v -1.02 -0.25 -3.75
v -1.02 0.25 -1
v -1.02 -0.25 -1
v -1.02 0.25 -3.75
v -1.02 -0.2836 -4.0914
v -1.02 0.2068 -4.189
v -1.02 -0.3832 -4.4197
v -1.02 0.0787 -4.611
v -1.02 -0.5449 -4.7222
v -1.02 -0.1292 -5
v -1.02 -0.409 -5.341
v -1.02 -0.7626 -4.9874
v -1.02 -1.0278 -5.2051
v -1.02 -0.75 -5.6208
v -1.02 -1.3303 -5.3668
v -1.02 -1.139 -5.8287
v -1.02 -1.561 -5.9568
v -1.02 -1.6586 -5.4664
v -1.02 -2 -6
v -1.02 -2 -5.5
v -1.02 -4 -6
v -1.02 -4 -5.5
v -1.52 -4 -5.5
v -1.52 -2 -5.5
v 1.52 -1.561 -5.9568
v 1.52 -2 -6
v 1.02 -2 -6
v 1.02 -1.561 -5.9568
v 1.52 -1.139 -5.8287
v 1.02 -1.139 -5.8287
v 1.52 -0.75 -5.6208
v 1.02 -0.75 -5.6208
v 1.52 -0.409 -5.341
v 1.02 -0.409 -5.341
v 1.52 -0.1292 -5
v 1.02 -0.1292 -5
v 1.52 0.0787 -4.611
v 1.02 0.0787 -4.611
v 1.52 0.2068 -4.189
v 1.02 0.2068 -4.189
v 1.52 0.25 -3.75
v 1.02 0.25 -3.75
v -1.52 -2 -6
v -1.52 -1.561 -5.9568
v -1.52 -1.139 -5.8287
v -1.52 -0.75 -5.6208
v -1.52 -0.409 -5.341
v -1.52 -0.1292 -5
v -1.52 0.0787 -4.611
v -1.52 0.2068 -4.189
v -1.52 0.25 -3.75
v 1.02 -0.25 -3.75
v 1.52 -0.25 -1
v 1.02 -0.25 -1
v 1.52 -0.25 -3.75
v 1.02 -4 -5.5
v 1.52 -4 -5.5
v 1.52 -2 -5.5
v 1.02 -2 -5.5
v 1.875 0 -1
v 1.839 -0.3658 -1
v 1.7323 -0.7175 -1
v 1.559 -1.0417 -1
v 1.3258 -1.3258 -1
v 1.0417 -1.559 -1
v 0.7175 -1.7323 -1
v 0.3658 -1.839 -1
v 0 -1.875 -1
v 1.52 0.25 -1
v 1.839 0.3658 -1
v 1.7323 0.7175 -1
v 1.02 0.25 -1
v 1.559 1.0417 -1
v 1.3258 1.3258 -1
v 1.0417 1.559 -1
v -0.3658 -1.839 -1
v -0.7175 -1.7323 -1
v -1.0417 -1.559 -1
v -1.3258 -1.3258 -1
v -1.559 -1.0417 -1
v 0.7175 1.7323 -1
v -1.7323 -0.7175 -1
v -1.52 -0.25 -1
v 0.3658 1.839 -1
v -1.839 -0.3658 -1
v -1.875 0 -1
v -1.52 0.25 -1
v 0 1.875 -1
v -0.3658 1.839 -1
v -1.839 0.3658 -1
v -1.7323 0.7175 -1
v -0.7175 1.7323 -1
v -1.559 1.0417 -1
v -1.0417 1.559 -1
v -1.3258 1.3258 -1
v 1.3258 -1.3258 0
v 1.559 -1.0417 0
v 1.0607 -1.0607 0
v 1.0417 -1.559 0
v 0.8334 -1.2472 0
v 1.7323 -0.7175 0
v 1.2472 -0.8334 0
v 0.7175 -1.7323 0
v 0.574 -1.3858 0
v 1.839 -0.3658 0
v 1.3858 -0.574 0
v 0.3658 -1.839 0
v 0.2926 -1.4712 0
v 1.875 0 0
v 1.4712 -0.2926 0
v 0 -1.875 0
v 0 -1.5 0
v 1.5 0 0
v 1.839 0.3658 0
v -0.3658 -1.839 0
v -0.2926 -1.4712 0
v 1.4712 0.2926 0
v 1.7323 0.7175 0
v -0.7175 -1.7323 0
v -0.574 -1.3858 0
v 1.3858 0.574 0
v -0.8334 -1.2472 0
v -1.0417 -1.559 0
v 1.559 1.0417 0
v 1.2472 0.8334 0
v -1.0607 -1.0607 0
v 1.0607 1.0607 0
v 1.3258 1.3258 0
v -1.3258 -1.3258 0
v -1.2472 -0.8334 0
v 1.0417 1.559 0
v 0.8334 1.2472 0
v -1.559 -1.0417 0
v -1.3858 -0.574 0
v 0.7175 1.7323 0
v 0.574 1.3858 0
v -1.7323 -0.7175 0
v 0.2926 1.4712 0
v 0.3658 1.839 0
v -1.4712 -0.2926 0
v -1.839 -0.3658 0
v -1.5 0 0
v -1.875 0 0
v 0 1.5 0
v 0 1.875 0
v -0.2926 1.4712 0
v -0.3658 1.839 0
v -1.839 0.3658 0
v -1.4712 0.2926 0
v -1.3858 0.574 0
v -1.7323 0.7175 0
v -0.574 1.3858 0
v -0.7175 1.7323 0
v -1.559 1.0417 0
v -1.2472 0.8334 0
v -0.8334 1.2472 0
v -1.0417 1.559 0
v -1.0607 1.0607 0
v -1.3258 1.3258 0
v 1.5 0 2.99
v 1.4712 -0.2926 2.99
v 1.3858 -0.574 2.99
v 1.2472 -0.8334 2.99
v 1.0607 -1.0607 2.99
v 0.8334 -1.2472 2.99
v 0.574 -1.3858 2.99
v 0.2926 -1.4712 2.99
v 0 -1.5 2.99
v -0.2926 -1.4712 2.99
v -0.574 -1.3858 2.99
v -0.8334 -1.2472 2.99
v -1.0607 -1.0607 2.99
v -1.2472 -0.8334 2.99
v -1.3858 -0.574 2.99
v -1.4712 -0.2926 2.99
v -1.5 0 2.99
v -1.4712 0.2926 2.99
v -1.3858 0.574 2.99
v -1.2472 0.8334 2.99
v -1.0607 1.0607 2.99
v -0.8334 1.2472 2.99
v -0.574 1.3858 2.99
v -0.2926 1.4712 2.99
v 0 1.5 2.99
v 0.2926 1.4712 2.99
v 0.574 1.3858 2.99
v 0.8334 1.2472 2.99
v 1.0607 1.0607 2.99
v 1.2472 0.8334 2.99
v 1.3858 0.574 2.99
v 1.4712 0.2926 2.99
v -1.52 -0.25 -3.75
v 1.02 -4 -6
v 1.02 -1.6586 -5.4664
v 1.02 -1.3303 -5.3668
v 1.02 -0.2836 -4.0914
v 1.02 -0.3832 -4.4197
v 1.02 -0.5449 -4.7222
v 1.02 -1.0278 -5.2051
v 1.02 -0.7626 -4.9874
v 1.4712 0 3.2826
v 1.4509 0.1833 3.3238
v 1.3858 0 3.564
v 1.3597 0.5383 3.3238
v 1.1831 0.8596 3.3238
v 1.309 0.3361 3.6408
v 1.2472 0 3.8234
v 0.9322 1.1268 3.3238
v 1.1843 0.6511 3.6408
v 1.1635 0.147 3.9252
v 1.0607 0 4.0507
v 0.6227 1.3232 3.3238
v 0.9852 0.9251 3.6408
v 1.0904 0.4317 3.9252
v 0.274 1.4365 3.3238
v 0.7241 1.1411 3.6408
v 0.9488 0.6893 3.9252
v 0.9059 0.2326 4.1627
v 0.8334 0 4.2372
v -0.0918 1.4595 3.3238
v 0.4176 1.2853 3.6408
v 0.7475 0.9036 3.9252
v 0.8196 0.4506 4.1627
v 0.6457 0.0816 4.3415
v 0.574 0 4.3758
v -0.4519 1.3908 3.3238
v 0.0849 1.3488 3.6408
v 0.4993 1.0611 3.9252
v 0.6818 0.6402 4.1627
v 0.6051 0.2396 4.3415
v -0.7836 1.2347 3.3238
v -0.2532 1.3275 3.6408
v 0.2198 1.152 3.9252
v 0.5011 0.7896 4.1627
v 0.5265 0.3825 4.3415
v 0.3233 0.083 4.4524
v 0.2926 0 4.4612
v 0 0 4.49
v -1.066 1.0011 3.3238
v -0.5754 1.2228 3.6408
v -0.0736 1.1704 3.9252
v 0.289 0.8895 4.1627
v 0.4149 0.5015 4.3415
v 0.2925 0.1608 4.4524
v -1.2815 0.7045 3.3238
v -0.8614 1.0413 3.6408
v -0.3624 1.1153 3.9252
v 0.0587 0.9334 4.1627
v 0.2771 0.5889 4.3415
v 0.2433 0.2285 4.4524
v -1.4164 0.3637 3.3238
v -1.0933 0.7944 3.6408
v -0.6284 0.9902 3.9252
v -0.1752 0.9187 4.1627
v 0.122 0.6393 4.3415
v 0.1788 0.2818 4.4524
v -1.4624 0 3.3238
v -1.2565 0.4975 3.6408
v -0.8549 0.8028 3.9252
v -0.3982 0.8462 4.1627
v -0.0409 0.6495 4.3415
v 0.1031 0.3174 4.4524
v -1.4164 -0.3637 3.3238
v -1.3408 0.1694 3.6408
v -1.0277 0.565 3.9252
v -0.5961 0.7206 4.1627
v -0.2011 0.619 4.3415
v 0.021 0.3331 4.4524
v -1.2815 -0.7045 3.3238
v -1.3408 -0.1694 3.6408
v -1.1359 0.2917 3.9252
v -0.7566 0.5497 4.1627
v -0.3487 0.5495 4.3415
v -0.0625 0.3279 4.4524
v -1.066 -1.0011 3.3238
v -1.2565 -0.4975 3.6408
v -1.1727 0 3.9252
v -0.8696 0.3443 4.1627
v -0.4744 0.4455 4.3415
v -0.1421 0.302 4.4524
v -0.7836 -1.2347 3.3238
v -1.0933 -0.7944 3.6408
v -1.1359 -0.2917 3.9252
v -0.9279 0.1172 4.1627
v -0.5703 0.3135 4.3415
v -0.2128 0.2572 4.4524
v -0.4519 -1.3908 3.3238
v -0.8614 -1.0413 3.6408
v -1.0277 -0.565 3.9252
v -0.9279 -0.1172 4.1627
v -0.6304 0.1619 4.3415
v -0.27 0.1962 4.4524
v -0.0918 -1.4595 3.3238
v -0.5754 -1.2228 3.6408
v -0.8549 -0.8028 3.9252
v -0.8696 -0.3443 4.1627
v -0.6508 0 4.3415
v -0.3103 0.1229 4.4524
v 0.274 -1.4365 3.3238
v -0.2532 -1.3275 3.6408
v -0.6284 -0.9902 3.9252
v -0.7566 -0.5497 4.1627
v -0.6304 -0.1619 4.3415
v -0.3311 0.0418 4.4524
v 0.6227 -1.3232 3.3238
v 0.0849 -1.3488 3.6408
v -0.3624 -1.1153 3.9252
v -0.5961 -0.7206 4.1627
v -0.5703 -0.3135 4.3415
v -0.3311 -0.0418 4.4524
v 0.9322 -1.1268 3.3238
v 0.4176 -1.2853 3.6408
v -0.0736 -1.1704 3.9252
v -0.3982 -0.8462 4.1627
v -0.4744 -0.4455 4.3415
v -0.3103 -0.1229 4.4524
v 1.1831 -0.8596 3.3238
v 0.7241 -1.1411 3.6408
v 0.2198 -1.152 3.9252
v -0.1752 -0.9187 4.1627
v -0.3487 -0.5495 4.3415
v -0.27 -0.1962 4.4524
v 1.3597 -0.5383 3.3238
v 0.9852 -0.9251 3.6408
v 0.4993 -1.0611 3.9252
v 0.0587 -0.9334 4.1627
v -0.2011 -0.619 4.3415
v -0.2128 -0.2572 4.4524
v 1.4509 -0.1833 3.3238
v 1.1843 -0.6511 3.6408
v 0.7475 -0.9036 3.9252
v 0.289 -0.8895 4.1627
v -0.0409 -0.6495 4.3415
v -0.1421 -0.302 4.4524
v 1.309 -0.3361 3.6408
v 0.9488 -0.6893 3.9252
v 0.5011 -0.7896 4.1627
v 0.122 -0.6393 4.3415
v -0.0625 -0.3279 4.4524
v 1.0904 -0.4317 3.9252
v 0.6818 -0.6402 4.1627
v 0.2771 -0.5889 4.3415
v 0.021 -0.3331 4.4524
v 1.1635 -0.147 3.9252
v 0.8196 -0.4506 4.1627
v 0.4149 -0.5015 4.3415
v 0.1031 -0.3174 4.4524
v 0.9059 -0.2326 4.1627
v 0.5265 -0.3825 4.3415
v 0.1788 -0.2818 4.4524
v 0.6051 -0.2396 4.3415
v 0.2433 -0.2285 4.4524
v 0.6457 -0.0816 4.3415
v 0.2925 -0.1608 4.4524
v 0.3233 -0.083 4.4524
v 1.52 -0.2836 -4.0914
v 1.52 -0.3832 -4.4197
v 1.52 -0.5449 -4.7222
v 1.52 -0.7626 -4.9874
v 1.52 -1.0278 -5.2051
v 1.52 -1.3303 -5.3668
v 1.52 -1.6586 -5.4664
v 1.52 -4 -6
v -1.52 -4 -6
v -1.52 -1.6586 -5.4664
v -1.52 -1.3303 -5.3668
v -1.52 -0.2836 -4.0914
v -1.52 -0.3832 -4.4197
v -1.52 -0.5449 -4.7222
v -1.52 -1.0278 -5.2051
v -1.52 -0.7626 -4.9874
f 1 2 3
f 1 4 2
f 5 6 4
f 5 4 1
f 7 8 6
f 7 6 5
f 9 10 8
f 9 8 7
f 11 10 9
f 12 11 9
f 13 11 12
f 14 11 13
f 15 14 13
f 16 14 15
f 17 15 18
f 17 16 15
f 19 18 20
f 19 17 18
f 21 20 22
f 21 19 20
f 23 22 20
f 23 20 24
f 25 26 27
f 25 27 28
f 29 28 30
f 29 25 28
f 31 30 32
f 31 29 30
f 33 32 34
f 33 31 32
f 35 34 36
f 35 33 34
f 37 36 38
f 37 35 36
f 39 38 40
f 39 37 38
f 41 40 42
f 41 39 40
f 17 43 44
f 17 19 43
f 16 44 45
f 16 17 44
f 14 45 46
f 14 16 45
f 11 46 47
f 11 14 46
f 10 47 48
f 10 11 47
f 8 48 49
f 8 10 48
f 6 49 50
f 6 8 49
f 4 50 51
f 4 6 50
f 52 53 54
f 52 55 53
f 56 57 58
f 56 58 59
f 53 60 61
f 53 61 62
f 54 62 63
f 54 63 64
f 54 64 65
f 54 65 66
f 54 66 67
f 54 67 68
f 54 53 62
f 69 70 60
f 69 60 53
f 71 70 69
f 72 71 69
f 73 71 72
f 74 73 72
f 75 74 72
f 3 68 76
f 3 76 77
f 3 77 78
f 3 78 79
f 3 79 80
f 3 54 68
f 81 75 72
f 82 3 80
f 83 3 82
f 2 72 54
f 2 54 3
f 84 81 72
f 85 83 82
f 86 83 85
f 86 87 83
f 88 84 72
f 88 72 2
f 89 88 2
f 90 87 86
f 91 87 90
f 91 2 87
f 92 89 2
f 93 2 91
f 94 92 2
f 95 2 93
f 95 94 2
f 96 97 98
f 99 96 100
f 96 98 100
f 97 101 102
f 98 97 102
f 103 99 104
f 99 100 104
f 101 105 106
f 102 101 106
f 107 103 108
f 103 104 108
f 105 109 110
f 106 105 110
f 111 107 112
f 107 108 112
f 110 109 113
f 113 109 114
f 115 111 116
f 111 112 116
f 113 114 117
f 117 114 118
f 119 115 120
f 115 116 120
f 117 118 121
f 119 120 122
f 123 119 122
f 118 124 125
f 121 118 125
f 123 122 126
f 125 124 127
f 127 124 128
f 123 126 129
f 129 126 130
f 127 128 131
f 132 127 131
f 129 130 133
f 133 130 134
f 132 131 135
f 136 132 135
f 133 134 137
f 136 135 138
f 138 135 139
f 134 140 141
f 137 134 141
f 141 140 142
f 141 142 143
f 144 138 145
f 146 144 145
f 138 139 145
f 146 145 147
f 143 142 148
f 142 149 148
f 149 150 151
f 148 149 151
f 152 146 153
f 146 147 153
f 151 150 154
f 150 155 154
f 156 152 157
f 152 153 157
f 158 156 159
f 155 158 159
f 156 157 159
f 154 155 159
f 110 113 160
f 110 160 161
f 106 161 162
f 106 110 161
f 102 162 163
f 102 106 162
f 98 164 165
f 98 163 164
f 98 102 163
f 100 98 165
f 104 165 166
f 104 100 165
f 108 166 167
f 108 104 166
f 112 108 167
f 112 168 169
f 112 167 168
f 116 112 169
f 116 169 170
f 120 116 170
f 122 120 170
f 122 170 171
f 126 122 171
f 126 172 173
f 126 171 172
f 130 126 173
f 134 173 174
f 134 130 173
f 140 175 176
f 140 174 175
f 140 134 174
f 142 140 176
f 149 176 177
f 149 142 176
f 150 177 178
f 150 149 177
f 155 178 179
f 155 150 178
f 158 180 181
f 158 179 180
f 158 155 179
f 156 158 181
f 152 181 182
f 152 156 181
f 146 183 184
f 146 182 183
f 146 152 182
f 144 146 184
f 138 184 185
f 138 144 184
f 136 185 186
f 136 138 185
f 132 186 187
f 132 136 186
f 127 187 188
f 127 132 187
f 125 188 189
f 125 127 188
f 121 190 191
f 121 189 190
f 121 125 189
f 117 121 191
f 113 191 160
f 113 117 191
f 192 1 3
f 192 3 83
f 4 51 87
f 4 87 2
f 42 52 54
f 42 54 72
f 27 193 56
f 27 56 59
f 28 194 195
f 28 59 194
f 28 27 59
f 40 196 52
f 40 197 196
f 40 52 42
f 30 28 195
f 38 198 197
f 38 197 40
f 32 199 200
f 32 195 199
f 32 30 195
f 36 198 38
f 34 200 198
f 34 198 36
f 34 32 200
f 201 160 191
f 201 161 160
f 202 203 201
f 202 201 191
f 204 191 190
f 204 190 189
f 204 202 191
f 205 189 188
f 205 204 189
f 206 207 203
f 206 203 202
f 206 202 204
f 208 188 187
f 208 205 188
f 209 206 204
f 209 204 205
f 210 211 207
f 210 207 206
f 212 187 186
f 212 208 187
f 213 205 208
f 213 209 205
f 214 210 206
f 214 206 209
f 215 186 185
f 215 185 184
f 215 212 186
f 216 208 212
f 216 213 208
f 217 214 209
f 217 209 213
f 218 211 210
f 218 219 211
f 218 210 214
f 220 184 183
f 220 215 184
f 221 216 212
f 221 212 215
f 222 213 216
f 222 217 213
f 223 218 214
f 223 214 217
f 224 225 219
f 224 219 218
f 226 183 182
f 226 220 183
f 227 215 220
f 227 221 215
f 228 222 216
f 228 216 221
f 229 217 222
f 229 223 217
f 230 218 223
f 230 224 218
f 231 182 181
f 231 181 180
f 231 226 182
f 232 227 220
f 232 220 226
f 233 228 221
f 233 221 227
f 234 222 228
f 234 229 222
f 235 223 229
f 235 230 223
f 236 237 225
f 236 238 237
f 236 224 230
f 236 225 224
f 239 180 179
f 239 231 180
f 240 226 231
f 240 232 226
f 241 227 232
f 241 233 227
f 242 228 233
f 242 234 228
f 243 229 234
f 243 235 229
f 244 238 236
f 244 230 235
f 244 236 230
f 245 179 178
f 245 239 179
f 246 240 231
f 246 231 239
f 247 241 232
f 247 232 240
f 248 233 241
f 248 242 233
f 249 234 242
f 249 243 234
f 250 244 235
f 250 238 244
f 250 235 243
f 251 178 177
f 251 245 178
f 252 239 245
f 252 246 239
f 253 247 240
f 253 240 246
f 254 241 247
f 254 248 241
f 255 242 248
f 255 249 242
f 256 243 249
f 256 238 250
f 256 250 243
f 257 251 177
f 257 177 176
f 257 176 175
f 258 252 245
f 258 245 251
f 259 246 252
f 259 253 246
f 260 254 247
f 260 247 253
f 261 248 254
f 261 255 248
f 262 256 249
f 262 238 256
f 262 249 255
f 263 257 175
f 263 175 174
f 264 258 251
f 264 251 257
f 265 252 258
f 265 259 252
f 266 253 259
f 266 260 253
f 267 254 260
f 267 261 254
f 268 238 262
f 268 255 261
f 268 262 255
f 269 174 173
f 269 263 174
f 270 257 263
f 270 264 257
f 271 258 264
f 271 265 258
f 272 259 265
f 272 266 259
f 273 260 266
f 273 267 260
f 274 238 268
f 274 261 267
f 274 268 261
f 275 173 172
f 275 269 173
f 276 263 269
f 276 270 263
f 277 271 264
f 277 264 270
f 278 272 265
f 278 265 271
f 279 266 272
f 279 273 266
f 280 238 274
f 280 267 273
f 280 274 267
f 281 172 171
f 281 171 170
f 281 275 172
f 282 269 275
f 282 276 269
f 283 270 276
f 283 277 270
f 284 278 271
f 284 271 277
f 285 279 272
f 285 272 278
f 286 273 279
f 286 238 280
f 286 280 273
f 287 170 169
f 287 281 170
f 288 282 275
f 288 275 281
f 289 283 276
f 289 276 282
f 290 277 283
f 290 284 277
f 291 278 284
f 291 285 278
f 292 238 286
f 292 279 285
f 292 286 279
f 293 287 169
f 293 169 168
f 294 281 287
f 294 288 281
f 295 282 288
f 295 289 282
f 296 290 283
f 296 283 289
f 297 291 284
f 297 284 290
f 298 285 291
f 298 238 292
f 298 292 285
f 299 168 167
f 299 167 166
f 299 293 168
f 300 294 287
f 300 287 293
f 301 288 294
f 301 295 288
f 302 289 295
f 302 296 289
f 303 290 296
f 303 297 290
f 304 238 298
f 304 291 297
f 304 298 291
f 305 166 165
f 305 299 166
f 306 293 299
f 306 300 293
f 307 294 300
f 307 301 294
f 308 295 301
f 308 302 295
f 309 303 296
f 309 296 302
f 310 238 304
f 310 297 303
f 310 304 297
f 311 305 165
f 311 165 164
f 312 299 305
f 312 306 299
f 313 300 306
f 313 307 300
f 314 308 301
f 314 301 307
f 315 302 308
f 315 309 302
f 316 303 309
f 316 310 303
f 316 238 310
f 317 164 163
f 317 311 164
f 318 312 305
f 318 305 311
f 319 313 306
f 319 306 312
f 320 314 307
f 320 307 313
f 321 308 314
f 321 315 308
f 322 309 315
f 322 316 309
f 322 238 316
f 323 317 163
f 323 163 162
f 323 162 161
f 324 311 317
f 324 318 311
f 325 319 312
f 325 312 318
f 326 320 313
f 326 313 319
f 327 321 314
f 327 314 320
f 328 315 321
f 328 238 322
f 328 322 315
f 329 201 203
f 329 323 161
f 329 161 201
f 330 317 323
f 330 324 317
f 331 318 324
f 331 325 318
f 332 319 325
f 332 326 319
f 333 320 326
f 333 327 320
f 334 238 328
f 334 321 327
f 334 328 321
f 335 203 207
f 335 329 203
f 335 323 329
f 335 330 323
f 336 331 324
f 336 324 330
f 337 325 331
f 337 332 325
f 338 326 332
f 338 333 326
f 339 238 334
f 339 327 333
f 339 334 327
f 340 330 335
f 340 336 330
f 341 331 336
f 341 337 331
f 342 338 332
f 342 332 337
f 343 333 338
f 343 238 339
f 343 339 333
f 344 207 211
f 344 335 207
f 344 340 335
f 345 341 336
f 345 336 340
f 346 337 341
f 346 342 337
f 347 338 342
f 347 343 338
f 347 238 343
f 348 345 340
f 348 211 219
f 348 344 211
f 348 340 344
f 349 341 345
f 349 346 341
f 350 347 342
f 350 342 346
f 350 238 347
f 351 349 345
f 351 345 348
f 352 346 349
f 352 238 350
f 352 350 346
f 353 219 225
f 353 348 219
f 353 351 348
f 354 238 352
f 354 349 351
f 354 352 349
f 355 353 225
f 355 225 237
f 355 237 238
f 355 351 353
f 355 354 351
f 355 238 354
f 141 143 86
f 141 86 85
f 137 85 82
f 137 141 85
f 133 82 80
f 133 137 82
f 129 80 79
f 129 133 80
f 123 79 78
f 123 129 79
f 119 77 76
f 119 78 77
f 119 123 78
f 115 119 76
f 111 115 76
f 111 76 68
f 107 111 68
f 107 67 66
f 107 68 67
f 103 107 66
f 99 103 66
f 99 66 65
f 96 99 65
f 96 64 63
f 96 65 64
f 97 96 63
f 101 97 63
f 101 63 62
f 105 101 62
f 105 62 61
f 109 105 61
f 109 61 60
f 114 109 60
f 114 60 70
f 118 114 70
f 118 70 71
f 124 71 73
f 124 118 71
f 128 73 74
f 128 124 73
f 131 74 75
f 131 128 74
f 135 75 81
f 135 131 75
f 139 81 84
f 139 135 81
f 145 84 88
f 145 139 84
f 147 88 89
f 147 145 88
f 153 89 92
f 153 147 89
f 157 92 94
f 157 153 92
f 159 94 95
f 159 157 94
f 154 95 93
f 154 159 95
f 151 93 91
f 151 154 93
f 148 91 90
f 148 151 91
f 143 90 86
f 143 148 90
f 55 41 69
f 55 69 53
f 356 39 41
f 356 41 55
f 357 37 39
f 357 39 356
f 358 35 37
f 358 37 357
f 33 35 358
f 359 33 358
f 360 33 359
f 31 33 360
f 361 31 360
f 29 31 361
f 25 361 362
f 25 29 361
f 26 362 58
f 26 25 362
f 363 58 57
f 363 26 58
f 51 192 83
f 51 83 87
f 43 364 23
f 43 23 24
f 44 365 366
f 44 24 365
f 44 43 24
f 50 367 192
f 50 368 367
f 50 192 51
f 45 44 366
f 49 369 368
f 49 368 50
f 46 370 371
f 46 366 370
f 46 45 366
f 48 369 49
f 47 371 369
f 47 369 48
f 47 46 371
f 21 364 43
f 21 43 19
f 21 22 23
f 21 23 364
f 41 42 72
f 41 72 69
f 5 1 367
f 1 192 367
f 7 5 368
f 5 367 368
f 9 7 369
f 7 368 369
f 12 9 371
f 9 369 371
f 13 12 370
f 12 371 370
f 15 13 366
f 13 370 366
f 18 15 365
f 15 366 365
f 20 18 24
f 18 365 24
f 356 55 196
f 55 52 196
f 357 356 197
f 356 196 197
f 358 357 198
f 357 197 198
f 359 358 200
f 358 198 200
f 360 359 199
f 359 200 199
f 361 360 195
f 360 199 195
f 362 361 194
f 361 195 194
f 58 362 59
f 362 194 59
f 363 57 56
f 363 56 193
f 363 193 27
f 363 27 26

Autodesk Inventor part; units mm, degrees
ref_plane "YZ Plane" through (0, 0, 0) normal (1, 0, 0) x (0, 1, 0)
ref_plane "XZ Plane" through (0, 0, 0) normal (0, 1, 0) x (-1, 0, 0)
ref_plane "XY Plane" through (0, 0, 0) normal (0, 0, 1) x (1, 0, 0)
sketch "Sketch1" plane through (0, 0, 0) normal (0, 0, 1) x (1, 0, 0)
  circle A0 centre (0, 0) radius 1.5
  dimension "d0" = 3
extrude "Extrusion1" add sketch "Sketch1" along normal blind 4.49
fillet "Fillet1" radius 1.5 1 edges at (-1.5, 0, 4.49)
sketch "Sketch2" plane through (0, 0, 0) normal (0, 0, -1) x (-1, 0, 0)
  circle A0 centre (0, 0) radius 1.5 projected
  circle A1 centre (0, 0) radius 1.875
  dimension "d4" = 3.75
extrude "Extrusion2" add sketch "Sketch2" along normal blind 1 contours A0 | A1
sketch "Sketch3" plane through (0, 0, -1) normal (0, 0, -1) x (-1, 0, 0)
  circle A0 centre (0, 0) radius 1.875 projected
  line L0 (-1.52, 0.25) -> (-1.02, 0.25)
  line L1 (-1.02, 0.25) -> (-1.02, -0.25)
  line L2 (-1.02, -0.25) -> (-1.52, -0.25)
  line L3 (-1.52, -0.25) -> (-1.52, 0.25)
  line L4 (1.02, 0.25) -> (1.52, 0.25)
  line L5 (1.52, 0.25) -> (1.52, -0.25)
  line L6 (1.52, -0.25) -> (1.02, -0.25)
  line L7 (1.02, -0.25) -> (1.02, 0.25)
  dimension "d7" = 0.5
  dimension "d8" = 0.5
  dimension "d9" = 0.5
  dimension "d10" = 0.5
  dimension "d11" = 0.25
  dimension "d12" = 0.25
  dimension "d13" = 1.02
  dimension "d14" = 1.02
sketch "Sketch4" plane through (0, 0, 0) normal (1, 0, 0) x (0, 1, 0)
  line L0 (0, -0.5) -> (0, -3.75)
  line L1 (-2, -5.75) -> (-4, -5.75)
  line L2 (-1.875, -1) -> (1.875, -1) projected
  arc A0 (-2, -5.75) -> (0, -3.75) centre (-2, -3.75) ccw
  line L3 (1.875, 0) -> (-1.875, 0) projected
  point P0 (0, 0)
  point P1 (0, -5.75)
  dimension "d16" = 4
  dimension "d17" = 5.25
  dimension "d18" = 2
  dimension "d19" = 1.875
  dimension "d21" = 0.5
sweep "Sweep1" add profiles "Sketch3" path "Sketch4" path curves L0 A0 L1 contours L0 L1 L2 L3 | L4 L5 L6 L7
properties part number "led"
